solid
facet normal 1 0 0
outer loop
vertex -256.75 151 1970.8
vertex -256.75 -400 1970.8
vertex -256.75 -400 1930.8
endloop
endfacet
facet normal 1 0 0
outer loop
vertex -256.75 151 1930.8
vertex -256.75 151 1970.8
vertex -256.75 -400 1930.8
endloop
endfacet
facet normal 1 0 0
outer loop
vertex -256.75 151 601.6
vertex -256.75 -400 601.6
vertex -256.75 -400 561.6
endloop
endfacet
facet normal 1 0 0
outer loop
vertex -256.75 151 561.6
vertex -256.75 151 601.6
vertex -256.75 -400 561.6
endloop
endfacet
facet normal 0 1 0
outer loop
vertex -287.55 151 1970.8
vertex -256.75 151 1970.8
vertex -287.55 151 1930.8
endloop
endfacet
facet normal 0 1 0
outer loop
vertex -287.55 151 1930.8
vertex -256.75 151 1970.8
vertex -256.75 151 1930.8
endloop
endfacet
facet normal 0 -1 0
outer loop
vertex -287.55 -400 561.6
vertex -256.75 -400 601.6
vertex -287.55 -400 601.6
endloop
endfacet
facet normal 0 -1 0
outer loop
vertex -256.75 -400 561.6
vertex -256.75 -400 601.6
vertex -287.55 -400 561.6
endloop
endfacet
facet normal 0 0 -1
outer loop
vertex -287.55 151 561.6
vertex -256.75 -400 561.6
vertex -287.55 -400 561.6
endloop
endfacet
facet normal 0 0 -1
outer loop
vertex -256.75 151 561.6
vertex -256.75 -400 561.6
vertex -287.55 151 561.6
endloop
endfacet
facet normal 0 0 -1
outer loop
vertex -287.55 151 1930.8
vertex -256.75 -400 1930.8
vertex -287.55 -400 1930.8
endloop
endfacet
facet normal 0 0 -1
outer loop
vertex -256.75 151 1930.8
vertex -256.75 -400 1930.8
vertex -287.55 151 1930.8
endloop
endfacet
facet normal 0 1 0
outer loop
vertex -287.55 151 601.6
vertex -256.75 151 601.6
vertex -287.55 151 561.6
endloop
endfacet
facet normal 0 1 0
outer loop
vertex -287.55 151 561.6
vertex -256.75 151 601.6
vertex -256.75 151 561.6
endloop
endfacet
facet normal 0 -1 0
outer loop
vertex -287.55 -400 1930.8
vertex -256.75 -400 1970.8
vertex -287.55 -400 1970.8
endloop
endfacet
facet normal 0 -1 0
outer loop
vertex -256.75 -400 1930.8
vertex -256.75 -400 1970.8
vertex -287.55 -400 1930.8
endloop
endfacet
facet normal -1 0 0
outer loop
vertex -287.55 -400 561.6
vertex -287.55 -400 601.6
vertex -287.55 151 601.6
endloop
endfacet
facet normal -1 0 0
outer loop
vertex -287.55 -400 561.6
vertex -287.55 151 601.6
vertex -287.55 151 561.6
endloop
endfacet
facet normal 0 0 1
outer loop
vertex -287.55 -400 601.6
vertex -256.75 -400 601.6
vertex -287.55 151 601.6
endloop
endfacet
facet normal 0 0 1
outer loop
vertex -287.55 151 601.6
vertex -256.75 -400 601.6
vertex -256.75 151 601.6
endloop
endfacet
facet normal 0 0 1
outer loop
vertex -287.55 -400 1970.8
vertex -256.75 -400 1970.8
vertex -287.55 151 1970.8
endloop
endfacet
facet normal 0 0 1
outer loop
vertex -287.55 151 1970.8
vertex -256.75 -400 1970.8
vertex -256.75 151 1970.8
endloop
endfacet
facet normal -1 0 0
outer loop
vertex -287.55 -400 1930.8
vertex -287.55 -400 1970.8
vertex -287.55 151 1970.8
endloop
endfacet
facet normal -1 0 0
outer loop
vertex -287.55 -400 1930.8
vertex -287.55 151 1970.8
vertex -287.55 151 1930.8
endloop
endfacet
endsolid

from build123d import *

# Parameters (mm, degrees)
SKETCH5_W           = 40
SKETCH5_H           = 551
BOSS_EXTRUDE2_DEPTH = 30.8
SKETCH10_W          = 40
SKETCH10_H          = 551
BOSS_EXTRUDE3_DEPTH = 30.8


with BuildPart() as part:
    # Sketch5 → Boss-Extrude2 (new body)
    with BuildSketch(Plane(origin=(-256.75, 0, 0), x_dir=(0, 0, -1), z_dir=(1, 0, 0))):
        with Locations((-1950.8, -124.5)):
            Rectangle(SKETCH5_W, SKETCH5_H)
    extrude(amount=-BOSS_EXTRUDE2_DEPTH)


with BuildPart() as body_2:
    # Sketch10 → Boss-Extrude3 (new body)
    with BuildSketch(Plane(origin=(-256.75, 0, 0), x_dir=(0, 0, -1), z_dir=(1, 0, 0))):
        with Locations((-581.6, -124.5)):
            Rectangle(SKETCH10_W, SKETCH10_H)
    extrude(amount=-BOSS_EXTRUDE3_DEPTH)


solid = Compound([part.part, body_2.part])
